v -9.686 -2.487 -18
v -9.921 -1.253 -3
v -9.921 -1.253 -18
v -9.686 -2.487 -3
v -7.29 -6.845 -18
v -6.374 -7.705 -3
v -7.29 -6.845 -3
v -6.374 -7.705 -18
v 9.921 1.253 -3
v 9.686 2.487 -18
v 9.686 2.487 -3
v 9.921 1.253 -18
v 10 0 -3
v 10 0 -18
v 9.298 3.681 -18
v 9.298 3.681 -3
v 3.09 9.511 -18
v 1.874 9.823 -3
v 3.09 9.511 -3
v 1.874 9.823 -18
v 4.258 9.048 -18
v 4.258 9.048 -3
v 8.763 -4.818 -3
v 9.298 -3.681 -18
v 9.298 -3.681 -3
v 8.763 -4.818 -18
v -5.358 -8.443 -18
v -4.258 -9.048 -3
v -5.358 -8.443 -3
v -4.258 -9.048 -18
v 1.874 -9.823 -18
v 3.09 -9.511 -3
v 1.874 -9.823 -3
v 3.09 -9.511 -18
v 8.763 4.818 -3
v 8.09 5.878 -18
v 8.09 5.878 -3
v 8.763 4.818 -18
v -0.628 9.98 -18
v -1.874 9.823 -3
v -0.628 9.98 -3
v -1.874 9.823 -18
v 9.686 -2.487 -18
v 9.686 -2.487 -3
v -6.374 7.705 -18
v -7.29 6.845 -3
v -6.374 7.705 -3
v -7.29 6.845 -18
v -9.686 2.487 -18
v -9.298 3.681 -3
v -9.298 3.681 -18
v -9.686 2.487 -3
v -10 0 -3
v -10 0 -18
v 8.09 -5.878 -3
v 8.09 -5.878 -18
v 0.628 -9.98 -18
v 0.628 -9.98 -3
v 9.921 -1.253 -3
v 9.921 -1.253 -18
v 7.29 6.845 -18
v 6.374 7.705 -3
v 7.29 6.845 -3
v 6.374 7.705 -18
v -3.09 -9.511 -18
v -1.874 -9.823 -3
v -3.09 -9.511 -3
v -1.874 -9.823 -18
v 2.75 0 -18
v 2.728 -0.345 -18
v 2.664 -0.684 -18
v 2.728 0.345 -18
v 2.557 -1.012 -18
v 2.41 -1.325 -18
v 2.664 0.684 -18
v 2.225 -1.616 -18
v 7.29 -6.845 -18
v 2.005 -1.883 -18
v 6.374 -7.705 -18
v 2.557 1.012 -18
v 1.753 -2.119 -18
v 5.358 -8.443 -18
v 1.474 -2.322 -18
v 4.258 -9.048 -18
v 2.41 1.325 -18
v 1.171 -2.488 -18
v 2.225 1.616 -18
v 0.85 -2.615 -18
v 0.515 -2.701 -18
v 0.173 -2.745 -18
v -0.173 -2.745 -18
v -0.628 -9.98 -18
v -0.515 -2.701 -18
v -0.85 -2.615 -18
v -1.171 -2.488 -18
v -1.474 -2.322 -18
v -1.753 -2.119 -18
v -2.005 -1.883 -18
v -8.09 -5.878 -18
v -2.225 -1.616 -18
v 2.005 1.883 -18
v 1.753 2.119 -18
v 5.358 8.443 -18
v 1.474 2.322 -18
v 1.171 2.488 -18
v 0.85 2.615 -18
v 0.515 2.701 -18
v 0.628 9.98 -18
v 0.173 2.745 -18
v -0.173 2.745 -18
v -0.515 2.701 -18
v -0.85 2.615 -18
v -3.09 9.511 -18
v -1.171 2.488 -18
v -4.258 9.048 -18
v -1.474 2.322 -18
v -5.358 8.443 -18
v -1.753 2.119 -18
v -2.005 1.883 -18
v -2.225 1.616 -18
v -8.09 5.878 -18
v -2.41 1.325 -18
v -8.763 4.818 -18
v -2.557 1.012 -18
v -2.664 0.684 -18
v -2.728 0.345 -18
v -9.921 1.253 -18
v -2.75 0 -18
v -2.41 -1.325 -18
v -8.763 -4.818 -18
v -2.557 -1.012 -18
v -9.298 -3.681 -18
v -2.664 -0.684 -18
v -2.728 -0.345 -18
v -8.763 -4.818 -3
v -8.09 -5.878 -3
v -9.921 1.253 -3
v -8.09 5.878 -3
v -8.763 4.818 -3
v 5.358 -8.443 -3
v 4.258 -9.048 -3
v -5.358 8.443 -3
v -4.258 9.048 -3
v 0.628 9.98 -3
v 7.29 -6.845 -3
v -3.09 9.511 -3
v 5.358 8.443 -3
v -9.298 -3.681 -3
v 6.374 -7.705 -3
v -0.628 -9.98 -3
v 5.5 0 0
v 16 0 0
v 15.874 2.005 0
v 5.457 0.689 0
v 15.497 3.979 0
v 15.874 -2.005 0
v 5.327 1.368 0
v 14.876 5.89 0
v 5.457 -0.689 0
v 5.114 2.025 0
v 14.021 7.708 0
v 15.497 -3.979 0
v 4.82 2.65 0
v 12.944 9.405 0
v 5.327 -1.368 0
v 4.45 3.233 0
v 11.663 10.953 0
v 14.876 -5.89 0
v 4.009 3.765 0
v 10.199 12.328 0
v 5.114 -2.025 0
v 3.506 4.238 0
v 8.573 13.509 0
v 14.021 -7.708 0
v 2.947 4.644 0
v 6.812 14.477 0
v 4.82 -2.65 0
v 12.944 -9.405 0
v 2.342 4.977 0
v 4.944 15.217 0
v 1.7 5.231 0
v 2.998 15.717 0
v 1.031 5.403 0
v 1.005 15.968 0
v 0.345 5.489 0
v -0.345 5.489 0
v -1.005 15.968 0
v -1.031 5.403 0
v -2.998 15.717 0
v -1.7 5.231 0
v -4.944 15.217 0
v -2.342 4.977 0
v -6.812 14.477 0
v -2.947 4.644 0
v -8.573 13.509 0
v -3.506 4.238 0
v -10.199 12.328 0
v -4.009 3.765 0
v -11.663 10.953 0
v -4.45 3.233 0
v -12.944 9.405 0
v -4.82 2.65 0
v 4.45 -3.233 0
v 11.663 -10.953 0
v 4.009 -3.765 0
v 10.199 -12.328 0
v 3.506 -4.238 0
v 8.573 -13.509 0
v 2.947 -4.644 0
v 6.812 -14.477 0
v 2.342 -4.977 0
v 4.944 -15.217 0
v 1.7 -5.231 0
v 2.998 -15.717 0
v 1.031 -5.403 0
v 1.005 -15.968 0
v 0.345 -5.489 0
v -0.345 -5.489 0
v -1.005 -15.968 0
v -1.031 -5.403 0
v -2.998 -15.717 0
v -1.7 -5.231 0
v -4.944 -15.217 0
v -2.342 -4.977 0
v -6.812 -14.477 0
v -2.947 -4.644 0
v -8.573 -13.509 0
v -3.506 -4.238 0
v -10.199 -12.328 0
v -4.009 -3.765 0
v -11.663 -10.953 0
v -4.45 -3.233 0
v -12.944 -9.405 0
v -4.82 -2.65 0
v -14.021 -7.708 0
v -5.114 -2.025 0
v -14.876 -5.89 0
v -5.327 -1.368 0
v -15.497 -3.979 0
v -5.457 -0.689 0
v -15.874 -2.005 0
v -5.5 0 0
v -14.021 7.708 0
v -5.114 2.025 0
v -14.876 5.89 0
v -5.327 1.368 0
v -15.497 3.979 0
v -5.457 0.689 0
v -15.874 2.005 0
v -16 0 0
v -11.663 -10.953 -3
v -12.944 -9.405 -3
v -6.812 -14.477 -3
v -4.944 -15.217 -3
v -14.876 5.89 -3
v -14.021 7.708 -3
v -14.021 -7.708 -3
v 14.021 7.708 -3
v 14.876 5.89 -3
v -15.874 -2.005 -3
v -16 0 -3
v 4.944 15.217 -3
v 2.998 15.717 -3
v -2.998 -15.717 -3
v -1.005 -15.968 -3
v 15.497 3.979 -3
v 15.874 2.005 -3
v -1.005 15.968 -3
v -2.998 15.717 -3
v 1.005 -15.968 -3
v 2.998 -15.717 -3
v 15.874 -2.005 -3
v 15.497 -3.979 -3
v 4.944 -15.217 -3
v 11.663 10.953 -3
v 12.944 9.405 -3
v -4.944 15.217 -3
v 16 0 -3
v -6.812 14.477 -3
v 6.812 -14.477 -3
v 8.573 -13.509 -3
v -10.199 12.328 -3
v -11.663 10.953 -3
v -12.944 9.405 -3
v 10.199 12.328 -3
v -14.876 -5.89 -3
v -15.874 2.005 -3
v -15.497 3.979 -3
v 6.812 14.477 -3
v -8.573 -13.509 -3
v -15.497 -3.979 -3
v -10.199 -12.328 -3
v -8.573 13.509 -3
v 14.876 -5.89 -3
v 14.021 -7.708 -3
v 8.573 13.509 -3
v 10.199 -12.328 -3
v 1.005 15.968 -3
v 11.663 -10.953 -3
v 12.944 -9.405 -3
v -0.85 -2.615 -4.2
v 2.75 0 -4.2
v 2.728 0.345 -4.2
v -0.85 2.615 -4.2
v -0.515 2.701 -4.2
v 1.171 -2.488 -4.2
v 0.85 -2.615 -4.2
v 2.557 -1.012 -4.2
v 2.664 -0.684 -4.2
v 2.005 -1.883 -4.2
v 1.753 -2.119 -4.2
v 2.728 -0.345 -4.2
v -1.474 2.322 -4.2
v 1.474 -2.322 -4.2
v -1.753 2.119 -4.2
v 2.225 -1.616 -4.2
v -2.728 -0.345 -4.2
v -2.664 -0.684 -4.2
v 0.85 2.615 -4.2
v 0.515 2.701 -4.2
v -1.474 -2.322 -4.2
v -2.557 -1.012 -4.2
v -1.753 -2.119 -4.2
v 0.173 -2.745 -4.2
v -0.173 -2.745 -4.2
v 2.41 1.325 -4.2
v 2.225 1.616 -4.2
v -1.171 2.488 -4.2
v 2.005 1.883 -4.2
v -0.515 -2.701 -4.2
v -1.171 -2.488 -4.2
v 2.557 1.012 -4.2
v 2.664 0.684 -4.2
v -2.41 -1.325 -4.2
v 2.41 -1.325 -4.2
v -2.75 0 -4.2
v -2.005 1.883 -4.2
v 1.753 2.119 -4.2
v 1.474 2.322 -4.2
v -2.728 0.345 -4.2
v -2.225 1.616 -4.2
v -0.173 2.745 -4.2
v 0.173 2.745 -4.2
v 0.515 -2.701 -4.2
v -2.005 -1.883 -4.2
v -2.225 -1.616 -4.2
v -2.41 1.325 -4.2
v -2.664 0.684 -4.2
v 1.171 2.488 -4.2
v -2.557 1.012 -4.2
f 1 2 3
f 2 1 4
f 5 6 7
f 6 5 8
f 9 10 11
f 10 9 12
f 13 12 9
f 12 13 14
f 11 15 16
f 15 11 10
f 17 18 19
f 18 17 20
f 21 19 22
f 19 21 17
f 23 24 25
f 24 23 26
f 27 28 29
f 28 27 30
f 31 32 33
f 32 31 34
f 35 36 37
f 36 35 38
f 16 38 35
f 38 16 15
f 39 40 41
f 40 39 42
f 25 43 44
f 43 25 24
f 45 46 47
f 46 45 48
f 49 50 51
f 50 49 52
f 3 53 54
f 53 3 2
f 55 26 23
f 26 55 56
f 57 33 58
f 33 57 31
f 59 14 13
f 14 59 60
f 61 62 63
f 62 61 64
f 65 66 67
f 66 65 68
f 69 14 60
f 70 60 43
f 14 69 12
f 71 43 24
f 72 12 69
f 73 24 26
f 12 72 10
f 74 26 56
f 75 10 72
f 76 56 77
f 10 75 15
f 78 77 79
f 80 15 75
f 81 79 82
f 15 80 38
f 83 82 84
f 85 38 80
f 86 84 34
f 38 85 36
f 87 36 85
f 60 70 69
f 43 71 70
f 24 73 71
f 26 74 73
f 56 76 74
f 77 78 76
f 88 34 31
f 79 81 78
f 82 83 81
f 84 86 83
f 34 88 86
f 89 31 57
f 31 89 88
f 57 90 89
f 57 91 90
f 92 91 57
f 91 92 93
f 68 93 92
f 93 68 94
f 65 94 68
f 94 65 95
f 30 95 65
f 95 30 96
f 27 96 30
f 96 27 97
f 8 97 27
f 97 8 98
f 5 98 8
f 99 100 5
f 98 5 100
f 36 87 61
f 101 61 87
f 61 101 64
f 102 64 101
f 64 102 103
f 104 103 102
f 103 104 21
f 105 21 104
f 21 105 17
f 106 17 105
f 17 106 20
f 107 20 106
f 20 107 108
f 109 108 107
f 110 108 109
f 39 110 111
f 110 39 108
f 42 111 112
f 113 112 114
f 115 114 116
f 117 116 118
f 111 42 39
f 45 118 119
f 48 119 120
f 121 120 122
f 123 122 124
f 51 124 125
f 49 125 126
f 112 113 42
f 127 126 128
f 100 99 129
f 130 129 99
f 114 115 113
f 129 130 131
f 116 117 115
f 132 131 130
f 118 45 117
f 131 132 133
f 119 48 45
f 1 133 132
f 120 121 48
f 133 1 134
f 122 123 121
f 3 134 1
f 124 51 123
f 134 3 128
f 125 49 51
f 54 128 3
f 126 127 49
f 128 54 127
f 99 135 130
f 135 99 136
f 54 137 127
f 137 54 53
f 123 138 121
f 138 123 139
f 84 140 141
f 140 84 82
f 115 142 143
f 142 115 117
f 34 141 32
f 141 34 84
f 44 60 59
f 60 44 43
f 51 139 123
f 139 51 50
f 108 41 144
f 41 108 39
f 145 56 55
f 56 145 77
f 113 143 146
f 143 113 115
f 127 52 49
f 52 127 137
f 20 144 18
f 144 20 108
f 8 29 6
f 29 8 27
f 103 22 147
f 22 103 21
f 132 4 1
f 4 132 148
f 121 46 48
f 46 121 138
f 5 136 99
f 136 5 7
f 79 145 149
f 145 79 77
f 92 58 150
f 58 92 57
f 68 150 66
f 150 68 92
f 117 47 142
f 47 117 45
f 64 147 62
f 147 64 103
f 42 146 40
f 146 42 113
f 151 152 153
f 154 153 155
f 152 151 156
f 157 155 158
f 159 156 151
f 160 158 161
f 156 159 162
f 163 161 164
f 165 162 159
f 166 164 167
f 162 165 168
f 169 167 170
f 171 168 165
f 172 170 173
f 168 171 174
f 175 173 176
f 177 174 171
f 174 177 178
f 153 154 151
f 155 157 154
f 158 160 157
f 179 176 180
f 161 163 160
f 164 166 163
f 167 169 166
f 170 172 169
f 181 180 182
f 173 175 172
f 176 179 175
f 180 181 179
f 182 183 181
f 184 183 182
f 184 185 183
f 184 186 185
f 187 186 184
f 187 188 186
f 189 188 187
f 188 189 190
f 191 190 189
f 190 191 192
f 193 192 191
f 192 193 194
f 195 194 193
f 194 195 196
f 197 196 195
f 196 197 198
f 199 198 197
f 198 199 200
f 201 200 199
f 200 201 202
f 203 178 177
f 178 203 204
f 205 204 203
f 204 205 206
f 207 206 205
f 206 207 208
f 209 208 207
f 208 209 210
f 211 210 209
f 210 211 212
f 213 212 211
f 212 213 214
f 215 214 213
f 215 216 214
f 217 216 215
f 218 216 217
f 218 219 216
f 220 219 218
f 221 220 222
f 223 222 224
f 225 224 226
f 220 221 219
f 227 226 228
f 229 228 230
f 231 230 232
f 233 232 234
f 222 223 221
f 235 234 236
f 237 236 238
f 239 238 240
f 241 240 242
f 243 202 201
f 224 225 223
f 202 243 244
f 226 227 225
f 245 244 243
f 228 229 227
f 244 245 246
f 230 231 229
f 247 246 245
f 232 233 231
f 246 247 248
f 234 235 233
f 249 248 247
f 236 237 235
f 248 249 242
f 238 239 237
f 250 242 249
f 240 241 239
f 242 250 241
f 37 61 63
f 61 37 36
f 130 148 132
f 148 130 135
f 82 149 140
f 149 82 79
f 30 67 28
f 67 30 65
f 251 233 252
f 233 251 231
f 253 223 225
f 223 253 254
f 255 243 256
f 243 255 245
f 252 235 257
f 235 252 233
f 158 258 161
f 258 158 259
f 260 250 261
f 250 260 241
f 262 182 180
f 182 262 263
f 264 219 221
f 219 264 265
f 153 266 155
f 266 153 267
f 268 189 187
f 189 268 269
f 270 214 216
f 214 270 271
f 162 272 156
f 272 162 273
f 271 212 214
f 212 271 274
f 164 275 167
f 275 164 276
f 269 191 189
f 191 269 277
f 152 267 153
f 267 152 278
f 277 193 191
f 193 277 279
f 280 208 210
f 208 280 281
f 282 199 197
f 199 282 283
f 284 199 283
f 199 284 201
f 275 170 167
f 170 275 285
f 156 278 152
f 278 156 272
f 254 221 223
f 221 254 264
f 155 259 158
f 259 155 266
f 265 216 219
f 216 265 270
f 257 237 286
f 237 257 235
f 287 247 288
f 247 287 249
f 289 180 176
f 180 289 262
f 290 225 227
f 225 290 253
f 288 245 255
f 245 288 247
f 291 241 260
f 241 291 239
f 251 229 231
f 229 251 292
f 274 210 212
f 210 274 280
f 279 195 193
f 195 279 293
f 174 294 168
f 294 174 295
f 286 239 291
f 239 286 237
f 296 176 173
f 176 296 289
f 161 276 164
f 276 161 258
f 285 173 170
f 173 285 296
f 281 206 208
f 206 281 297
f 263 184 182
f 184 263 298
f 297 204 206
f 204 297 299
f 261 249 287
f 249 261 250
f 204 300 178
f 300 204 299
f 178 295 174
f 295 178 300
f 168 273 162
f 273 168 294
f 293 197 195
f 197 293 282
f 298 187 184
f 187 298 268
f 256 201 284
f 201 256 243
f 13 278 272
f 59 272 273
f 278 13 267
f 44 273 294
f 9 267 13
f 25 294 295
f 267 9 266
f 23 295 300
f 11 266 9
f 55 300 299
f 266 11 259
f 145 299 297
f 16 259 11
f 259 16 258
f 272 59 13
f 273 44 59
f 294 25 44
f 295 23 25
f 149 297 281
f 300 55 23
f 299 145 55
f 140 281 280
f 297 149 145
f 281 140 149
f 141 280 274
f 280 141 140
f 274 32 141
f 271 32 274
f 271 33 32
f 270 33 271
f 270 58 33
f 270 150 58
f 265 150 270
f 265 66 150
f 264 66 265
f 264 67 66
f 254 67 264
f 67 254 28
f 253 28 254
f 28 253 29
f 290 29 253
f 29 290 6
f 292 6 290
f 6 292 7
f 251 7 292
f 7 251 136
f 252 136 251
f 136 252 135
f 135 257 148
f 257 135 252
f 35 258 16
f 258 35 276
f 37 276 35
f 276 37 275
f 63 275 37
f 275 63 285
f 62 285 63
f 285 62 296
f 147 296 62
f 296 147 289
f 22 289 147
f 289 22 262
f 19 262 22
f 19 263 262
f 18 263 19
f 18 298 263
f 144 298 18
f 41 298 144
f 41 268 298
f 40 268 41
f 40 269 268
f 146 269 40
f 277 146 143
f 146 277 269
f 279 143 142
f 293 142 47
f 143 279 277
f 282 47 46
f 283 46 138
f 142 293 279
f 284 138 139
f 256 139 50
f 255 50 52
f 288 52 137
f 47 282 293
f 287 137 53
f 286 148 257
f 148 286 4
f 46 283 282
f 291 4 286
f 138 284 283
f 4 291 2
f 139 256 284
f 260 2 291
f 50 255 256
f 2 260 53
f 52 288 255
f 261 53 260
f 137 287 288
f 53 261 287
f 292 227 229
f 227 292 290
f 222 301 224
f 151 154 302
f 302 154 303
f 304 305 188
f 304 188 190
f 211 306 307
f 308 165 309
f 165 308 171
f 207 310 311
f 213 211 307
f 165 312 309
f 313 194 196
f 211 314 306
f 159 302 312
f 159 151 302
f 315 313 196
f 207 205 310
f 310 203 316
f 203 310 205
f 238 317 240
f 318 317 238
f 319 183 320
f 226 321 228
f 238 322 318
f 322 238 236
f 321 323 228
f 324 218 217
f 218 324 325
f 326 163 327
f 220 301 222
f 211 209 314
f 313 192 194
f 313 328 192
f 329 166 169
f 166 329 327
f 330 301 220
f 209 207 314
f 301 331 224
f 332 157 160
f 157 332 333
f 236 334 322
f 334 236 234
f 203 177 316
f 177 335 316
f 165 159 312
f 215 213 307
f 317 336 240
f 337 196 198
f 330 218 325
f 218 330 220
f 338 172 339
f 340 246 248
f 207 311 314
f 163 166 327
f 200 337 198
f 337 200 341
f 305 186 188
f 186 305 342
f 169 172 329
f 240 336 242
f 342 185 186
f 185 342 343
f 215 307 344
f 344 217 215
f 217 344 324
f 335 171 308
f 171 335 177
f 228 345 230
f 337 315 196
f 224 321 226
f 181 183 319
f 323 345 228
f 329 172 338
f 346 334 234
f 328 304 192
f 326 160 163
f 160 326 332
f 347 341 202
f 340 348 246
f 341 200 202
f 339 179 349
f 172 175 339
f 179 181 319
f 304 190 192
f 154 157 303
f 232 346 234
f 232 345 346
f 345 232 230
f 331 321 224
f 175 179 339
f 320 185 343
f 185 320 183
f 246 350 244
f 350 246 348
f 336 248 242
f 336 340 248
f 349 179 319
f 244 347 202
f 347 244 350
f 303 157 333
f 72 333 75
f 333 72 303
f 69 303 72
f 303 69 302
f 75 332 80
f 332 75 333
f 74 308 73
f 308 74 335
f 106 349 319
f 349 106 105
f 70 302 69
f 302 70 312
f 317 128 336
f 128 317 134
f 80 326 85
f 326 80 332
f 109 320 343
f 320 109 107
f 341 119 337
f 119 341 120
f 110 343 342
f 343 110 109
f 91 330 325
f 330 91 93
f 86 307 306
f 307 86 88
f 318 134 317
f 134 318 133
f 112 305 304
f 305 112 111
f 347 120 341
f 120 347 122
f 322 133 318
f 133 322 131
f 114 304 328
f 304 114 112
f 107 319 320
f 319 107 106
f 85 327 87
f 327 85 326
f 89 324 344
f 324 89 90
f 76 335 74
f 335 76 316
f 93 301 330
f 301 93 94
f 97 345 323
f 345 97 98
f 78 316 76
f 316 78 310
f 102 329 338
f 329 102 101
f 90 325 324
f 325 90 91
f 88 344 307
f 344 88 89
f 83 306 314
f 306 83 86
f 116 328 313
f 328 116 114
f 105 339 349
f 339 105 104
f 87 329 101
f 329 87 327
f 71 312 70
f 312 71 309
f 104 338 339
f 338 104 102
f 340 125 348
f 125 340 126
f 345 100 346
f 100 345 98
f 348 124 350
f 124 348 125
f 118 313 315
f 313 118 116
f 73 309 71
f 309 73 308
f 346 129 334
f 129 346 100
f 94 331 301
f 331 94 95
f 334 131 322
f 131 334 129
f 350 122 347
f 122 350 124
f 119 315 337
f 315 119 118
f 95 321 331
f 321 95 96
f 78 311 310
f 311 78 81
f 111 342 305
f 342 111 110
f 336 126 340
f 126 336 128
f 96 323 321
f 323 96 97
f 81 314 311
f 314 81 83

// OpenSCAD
$fn = 50;


difference() {
	union() {
		translate(v = [0, 0, -18.0000000000]) {
			cylinder(h = 18, r = 10.0000000000);
		}
		translate(v = [0, 0, -3.0000000000]) {
			cylinder(h = 3, r = 16.0000000000);
		}
	}
	union() {
		translate(v = [0, 0, 0]) {
			rotate(a = [0, 0, 0]) {
				difference() {
					union() {
						#translate(v = [0, 0, -18.0000000000]) {
							cylinder(h = 18, r = 2.2500000000);
						}
						#translate(v = [0, 0, -4.2000000000]) {
							cylinder(h = 4.2000000000, r1 = 2.7500000000, r2 = 5.5000000000);
						}
						#translate(v = [0, 0, -18.0000000000]) {
							cylinder(h = 18, r = 2.7500000000);
						}
						#translate(v = [0, 0, -18.0000000000]) {
							cylinder(h = 18, r = 2.2500000000);
						}
					}
					union();
				}
			}
		}
	}
}
